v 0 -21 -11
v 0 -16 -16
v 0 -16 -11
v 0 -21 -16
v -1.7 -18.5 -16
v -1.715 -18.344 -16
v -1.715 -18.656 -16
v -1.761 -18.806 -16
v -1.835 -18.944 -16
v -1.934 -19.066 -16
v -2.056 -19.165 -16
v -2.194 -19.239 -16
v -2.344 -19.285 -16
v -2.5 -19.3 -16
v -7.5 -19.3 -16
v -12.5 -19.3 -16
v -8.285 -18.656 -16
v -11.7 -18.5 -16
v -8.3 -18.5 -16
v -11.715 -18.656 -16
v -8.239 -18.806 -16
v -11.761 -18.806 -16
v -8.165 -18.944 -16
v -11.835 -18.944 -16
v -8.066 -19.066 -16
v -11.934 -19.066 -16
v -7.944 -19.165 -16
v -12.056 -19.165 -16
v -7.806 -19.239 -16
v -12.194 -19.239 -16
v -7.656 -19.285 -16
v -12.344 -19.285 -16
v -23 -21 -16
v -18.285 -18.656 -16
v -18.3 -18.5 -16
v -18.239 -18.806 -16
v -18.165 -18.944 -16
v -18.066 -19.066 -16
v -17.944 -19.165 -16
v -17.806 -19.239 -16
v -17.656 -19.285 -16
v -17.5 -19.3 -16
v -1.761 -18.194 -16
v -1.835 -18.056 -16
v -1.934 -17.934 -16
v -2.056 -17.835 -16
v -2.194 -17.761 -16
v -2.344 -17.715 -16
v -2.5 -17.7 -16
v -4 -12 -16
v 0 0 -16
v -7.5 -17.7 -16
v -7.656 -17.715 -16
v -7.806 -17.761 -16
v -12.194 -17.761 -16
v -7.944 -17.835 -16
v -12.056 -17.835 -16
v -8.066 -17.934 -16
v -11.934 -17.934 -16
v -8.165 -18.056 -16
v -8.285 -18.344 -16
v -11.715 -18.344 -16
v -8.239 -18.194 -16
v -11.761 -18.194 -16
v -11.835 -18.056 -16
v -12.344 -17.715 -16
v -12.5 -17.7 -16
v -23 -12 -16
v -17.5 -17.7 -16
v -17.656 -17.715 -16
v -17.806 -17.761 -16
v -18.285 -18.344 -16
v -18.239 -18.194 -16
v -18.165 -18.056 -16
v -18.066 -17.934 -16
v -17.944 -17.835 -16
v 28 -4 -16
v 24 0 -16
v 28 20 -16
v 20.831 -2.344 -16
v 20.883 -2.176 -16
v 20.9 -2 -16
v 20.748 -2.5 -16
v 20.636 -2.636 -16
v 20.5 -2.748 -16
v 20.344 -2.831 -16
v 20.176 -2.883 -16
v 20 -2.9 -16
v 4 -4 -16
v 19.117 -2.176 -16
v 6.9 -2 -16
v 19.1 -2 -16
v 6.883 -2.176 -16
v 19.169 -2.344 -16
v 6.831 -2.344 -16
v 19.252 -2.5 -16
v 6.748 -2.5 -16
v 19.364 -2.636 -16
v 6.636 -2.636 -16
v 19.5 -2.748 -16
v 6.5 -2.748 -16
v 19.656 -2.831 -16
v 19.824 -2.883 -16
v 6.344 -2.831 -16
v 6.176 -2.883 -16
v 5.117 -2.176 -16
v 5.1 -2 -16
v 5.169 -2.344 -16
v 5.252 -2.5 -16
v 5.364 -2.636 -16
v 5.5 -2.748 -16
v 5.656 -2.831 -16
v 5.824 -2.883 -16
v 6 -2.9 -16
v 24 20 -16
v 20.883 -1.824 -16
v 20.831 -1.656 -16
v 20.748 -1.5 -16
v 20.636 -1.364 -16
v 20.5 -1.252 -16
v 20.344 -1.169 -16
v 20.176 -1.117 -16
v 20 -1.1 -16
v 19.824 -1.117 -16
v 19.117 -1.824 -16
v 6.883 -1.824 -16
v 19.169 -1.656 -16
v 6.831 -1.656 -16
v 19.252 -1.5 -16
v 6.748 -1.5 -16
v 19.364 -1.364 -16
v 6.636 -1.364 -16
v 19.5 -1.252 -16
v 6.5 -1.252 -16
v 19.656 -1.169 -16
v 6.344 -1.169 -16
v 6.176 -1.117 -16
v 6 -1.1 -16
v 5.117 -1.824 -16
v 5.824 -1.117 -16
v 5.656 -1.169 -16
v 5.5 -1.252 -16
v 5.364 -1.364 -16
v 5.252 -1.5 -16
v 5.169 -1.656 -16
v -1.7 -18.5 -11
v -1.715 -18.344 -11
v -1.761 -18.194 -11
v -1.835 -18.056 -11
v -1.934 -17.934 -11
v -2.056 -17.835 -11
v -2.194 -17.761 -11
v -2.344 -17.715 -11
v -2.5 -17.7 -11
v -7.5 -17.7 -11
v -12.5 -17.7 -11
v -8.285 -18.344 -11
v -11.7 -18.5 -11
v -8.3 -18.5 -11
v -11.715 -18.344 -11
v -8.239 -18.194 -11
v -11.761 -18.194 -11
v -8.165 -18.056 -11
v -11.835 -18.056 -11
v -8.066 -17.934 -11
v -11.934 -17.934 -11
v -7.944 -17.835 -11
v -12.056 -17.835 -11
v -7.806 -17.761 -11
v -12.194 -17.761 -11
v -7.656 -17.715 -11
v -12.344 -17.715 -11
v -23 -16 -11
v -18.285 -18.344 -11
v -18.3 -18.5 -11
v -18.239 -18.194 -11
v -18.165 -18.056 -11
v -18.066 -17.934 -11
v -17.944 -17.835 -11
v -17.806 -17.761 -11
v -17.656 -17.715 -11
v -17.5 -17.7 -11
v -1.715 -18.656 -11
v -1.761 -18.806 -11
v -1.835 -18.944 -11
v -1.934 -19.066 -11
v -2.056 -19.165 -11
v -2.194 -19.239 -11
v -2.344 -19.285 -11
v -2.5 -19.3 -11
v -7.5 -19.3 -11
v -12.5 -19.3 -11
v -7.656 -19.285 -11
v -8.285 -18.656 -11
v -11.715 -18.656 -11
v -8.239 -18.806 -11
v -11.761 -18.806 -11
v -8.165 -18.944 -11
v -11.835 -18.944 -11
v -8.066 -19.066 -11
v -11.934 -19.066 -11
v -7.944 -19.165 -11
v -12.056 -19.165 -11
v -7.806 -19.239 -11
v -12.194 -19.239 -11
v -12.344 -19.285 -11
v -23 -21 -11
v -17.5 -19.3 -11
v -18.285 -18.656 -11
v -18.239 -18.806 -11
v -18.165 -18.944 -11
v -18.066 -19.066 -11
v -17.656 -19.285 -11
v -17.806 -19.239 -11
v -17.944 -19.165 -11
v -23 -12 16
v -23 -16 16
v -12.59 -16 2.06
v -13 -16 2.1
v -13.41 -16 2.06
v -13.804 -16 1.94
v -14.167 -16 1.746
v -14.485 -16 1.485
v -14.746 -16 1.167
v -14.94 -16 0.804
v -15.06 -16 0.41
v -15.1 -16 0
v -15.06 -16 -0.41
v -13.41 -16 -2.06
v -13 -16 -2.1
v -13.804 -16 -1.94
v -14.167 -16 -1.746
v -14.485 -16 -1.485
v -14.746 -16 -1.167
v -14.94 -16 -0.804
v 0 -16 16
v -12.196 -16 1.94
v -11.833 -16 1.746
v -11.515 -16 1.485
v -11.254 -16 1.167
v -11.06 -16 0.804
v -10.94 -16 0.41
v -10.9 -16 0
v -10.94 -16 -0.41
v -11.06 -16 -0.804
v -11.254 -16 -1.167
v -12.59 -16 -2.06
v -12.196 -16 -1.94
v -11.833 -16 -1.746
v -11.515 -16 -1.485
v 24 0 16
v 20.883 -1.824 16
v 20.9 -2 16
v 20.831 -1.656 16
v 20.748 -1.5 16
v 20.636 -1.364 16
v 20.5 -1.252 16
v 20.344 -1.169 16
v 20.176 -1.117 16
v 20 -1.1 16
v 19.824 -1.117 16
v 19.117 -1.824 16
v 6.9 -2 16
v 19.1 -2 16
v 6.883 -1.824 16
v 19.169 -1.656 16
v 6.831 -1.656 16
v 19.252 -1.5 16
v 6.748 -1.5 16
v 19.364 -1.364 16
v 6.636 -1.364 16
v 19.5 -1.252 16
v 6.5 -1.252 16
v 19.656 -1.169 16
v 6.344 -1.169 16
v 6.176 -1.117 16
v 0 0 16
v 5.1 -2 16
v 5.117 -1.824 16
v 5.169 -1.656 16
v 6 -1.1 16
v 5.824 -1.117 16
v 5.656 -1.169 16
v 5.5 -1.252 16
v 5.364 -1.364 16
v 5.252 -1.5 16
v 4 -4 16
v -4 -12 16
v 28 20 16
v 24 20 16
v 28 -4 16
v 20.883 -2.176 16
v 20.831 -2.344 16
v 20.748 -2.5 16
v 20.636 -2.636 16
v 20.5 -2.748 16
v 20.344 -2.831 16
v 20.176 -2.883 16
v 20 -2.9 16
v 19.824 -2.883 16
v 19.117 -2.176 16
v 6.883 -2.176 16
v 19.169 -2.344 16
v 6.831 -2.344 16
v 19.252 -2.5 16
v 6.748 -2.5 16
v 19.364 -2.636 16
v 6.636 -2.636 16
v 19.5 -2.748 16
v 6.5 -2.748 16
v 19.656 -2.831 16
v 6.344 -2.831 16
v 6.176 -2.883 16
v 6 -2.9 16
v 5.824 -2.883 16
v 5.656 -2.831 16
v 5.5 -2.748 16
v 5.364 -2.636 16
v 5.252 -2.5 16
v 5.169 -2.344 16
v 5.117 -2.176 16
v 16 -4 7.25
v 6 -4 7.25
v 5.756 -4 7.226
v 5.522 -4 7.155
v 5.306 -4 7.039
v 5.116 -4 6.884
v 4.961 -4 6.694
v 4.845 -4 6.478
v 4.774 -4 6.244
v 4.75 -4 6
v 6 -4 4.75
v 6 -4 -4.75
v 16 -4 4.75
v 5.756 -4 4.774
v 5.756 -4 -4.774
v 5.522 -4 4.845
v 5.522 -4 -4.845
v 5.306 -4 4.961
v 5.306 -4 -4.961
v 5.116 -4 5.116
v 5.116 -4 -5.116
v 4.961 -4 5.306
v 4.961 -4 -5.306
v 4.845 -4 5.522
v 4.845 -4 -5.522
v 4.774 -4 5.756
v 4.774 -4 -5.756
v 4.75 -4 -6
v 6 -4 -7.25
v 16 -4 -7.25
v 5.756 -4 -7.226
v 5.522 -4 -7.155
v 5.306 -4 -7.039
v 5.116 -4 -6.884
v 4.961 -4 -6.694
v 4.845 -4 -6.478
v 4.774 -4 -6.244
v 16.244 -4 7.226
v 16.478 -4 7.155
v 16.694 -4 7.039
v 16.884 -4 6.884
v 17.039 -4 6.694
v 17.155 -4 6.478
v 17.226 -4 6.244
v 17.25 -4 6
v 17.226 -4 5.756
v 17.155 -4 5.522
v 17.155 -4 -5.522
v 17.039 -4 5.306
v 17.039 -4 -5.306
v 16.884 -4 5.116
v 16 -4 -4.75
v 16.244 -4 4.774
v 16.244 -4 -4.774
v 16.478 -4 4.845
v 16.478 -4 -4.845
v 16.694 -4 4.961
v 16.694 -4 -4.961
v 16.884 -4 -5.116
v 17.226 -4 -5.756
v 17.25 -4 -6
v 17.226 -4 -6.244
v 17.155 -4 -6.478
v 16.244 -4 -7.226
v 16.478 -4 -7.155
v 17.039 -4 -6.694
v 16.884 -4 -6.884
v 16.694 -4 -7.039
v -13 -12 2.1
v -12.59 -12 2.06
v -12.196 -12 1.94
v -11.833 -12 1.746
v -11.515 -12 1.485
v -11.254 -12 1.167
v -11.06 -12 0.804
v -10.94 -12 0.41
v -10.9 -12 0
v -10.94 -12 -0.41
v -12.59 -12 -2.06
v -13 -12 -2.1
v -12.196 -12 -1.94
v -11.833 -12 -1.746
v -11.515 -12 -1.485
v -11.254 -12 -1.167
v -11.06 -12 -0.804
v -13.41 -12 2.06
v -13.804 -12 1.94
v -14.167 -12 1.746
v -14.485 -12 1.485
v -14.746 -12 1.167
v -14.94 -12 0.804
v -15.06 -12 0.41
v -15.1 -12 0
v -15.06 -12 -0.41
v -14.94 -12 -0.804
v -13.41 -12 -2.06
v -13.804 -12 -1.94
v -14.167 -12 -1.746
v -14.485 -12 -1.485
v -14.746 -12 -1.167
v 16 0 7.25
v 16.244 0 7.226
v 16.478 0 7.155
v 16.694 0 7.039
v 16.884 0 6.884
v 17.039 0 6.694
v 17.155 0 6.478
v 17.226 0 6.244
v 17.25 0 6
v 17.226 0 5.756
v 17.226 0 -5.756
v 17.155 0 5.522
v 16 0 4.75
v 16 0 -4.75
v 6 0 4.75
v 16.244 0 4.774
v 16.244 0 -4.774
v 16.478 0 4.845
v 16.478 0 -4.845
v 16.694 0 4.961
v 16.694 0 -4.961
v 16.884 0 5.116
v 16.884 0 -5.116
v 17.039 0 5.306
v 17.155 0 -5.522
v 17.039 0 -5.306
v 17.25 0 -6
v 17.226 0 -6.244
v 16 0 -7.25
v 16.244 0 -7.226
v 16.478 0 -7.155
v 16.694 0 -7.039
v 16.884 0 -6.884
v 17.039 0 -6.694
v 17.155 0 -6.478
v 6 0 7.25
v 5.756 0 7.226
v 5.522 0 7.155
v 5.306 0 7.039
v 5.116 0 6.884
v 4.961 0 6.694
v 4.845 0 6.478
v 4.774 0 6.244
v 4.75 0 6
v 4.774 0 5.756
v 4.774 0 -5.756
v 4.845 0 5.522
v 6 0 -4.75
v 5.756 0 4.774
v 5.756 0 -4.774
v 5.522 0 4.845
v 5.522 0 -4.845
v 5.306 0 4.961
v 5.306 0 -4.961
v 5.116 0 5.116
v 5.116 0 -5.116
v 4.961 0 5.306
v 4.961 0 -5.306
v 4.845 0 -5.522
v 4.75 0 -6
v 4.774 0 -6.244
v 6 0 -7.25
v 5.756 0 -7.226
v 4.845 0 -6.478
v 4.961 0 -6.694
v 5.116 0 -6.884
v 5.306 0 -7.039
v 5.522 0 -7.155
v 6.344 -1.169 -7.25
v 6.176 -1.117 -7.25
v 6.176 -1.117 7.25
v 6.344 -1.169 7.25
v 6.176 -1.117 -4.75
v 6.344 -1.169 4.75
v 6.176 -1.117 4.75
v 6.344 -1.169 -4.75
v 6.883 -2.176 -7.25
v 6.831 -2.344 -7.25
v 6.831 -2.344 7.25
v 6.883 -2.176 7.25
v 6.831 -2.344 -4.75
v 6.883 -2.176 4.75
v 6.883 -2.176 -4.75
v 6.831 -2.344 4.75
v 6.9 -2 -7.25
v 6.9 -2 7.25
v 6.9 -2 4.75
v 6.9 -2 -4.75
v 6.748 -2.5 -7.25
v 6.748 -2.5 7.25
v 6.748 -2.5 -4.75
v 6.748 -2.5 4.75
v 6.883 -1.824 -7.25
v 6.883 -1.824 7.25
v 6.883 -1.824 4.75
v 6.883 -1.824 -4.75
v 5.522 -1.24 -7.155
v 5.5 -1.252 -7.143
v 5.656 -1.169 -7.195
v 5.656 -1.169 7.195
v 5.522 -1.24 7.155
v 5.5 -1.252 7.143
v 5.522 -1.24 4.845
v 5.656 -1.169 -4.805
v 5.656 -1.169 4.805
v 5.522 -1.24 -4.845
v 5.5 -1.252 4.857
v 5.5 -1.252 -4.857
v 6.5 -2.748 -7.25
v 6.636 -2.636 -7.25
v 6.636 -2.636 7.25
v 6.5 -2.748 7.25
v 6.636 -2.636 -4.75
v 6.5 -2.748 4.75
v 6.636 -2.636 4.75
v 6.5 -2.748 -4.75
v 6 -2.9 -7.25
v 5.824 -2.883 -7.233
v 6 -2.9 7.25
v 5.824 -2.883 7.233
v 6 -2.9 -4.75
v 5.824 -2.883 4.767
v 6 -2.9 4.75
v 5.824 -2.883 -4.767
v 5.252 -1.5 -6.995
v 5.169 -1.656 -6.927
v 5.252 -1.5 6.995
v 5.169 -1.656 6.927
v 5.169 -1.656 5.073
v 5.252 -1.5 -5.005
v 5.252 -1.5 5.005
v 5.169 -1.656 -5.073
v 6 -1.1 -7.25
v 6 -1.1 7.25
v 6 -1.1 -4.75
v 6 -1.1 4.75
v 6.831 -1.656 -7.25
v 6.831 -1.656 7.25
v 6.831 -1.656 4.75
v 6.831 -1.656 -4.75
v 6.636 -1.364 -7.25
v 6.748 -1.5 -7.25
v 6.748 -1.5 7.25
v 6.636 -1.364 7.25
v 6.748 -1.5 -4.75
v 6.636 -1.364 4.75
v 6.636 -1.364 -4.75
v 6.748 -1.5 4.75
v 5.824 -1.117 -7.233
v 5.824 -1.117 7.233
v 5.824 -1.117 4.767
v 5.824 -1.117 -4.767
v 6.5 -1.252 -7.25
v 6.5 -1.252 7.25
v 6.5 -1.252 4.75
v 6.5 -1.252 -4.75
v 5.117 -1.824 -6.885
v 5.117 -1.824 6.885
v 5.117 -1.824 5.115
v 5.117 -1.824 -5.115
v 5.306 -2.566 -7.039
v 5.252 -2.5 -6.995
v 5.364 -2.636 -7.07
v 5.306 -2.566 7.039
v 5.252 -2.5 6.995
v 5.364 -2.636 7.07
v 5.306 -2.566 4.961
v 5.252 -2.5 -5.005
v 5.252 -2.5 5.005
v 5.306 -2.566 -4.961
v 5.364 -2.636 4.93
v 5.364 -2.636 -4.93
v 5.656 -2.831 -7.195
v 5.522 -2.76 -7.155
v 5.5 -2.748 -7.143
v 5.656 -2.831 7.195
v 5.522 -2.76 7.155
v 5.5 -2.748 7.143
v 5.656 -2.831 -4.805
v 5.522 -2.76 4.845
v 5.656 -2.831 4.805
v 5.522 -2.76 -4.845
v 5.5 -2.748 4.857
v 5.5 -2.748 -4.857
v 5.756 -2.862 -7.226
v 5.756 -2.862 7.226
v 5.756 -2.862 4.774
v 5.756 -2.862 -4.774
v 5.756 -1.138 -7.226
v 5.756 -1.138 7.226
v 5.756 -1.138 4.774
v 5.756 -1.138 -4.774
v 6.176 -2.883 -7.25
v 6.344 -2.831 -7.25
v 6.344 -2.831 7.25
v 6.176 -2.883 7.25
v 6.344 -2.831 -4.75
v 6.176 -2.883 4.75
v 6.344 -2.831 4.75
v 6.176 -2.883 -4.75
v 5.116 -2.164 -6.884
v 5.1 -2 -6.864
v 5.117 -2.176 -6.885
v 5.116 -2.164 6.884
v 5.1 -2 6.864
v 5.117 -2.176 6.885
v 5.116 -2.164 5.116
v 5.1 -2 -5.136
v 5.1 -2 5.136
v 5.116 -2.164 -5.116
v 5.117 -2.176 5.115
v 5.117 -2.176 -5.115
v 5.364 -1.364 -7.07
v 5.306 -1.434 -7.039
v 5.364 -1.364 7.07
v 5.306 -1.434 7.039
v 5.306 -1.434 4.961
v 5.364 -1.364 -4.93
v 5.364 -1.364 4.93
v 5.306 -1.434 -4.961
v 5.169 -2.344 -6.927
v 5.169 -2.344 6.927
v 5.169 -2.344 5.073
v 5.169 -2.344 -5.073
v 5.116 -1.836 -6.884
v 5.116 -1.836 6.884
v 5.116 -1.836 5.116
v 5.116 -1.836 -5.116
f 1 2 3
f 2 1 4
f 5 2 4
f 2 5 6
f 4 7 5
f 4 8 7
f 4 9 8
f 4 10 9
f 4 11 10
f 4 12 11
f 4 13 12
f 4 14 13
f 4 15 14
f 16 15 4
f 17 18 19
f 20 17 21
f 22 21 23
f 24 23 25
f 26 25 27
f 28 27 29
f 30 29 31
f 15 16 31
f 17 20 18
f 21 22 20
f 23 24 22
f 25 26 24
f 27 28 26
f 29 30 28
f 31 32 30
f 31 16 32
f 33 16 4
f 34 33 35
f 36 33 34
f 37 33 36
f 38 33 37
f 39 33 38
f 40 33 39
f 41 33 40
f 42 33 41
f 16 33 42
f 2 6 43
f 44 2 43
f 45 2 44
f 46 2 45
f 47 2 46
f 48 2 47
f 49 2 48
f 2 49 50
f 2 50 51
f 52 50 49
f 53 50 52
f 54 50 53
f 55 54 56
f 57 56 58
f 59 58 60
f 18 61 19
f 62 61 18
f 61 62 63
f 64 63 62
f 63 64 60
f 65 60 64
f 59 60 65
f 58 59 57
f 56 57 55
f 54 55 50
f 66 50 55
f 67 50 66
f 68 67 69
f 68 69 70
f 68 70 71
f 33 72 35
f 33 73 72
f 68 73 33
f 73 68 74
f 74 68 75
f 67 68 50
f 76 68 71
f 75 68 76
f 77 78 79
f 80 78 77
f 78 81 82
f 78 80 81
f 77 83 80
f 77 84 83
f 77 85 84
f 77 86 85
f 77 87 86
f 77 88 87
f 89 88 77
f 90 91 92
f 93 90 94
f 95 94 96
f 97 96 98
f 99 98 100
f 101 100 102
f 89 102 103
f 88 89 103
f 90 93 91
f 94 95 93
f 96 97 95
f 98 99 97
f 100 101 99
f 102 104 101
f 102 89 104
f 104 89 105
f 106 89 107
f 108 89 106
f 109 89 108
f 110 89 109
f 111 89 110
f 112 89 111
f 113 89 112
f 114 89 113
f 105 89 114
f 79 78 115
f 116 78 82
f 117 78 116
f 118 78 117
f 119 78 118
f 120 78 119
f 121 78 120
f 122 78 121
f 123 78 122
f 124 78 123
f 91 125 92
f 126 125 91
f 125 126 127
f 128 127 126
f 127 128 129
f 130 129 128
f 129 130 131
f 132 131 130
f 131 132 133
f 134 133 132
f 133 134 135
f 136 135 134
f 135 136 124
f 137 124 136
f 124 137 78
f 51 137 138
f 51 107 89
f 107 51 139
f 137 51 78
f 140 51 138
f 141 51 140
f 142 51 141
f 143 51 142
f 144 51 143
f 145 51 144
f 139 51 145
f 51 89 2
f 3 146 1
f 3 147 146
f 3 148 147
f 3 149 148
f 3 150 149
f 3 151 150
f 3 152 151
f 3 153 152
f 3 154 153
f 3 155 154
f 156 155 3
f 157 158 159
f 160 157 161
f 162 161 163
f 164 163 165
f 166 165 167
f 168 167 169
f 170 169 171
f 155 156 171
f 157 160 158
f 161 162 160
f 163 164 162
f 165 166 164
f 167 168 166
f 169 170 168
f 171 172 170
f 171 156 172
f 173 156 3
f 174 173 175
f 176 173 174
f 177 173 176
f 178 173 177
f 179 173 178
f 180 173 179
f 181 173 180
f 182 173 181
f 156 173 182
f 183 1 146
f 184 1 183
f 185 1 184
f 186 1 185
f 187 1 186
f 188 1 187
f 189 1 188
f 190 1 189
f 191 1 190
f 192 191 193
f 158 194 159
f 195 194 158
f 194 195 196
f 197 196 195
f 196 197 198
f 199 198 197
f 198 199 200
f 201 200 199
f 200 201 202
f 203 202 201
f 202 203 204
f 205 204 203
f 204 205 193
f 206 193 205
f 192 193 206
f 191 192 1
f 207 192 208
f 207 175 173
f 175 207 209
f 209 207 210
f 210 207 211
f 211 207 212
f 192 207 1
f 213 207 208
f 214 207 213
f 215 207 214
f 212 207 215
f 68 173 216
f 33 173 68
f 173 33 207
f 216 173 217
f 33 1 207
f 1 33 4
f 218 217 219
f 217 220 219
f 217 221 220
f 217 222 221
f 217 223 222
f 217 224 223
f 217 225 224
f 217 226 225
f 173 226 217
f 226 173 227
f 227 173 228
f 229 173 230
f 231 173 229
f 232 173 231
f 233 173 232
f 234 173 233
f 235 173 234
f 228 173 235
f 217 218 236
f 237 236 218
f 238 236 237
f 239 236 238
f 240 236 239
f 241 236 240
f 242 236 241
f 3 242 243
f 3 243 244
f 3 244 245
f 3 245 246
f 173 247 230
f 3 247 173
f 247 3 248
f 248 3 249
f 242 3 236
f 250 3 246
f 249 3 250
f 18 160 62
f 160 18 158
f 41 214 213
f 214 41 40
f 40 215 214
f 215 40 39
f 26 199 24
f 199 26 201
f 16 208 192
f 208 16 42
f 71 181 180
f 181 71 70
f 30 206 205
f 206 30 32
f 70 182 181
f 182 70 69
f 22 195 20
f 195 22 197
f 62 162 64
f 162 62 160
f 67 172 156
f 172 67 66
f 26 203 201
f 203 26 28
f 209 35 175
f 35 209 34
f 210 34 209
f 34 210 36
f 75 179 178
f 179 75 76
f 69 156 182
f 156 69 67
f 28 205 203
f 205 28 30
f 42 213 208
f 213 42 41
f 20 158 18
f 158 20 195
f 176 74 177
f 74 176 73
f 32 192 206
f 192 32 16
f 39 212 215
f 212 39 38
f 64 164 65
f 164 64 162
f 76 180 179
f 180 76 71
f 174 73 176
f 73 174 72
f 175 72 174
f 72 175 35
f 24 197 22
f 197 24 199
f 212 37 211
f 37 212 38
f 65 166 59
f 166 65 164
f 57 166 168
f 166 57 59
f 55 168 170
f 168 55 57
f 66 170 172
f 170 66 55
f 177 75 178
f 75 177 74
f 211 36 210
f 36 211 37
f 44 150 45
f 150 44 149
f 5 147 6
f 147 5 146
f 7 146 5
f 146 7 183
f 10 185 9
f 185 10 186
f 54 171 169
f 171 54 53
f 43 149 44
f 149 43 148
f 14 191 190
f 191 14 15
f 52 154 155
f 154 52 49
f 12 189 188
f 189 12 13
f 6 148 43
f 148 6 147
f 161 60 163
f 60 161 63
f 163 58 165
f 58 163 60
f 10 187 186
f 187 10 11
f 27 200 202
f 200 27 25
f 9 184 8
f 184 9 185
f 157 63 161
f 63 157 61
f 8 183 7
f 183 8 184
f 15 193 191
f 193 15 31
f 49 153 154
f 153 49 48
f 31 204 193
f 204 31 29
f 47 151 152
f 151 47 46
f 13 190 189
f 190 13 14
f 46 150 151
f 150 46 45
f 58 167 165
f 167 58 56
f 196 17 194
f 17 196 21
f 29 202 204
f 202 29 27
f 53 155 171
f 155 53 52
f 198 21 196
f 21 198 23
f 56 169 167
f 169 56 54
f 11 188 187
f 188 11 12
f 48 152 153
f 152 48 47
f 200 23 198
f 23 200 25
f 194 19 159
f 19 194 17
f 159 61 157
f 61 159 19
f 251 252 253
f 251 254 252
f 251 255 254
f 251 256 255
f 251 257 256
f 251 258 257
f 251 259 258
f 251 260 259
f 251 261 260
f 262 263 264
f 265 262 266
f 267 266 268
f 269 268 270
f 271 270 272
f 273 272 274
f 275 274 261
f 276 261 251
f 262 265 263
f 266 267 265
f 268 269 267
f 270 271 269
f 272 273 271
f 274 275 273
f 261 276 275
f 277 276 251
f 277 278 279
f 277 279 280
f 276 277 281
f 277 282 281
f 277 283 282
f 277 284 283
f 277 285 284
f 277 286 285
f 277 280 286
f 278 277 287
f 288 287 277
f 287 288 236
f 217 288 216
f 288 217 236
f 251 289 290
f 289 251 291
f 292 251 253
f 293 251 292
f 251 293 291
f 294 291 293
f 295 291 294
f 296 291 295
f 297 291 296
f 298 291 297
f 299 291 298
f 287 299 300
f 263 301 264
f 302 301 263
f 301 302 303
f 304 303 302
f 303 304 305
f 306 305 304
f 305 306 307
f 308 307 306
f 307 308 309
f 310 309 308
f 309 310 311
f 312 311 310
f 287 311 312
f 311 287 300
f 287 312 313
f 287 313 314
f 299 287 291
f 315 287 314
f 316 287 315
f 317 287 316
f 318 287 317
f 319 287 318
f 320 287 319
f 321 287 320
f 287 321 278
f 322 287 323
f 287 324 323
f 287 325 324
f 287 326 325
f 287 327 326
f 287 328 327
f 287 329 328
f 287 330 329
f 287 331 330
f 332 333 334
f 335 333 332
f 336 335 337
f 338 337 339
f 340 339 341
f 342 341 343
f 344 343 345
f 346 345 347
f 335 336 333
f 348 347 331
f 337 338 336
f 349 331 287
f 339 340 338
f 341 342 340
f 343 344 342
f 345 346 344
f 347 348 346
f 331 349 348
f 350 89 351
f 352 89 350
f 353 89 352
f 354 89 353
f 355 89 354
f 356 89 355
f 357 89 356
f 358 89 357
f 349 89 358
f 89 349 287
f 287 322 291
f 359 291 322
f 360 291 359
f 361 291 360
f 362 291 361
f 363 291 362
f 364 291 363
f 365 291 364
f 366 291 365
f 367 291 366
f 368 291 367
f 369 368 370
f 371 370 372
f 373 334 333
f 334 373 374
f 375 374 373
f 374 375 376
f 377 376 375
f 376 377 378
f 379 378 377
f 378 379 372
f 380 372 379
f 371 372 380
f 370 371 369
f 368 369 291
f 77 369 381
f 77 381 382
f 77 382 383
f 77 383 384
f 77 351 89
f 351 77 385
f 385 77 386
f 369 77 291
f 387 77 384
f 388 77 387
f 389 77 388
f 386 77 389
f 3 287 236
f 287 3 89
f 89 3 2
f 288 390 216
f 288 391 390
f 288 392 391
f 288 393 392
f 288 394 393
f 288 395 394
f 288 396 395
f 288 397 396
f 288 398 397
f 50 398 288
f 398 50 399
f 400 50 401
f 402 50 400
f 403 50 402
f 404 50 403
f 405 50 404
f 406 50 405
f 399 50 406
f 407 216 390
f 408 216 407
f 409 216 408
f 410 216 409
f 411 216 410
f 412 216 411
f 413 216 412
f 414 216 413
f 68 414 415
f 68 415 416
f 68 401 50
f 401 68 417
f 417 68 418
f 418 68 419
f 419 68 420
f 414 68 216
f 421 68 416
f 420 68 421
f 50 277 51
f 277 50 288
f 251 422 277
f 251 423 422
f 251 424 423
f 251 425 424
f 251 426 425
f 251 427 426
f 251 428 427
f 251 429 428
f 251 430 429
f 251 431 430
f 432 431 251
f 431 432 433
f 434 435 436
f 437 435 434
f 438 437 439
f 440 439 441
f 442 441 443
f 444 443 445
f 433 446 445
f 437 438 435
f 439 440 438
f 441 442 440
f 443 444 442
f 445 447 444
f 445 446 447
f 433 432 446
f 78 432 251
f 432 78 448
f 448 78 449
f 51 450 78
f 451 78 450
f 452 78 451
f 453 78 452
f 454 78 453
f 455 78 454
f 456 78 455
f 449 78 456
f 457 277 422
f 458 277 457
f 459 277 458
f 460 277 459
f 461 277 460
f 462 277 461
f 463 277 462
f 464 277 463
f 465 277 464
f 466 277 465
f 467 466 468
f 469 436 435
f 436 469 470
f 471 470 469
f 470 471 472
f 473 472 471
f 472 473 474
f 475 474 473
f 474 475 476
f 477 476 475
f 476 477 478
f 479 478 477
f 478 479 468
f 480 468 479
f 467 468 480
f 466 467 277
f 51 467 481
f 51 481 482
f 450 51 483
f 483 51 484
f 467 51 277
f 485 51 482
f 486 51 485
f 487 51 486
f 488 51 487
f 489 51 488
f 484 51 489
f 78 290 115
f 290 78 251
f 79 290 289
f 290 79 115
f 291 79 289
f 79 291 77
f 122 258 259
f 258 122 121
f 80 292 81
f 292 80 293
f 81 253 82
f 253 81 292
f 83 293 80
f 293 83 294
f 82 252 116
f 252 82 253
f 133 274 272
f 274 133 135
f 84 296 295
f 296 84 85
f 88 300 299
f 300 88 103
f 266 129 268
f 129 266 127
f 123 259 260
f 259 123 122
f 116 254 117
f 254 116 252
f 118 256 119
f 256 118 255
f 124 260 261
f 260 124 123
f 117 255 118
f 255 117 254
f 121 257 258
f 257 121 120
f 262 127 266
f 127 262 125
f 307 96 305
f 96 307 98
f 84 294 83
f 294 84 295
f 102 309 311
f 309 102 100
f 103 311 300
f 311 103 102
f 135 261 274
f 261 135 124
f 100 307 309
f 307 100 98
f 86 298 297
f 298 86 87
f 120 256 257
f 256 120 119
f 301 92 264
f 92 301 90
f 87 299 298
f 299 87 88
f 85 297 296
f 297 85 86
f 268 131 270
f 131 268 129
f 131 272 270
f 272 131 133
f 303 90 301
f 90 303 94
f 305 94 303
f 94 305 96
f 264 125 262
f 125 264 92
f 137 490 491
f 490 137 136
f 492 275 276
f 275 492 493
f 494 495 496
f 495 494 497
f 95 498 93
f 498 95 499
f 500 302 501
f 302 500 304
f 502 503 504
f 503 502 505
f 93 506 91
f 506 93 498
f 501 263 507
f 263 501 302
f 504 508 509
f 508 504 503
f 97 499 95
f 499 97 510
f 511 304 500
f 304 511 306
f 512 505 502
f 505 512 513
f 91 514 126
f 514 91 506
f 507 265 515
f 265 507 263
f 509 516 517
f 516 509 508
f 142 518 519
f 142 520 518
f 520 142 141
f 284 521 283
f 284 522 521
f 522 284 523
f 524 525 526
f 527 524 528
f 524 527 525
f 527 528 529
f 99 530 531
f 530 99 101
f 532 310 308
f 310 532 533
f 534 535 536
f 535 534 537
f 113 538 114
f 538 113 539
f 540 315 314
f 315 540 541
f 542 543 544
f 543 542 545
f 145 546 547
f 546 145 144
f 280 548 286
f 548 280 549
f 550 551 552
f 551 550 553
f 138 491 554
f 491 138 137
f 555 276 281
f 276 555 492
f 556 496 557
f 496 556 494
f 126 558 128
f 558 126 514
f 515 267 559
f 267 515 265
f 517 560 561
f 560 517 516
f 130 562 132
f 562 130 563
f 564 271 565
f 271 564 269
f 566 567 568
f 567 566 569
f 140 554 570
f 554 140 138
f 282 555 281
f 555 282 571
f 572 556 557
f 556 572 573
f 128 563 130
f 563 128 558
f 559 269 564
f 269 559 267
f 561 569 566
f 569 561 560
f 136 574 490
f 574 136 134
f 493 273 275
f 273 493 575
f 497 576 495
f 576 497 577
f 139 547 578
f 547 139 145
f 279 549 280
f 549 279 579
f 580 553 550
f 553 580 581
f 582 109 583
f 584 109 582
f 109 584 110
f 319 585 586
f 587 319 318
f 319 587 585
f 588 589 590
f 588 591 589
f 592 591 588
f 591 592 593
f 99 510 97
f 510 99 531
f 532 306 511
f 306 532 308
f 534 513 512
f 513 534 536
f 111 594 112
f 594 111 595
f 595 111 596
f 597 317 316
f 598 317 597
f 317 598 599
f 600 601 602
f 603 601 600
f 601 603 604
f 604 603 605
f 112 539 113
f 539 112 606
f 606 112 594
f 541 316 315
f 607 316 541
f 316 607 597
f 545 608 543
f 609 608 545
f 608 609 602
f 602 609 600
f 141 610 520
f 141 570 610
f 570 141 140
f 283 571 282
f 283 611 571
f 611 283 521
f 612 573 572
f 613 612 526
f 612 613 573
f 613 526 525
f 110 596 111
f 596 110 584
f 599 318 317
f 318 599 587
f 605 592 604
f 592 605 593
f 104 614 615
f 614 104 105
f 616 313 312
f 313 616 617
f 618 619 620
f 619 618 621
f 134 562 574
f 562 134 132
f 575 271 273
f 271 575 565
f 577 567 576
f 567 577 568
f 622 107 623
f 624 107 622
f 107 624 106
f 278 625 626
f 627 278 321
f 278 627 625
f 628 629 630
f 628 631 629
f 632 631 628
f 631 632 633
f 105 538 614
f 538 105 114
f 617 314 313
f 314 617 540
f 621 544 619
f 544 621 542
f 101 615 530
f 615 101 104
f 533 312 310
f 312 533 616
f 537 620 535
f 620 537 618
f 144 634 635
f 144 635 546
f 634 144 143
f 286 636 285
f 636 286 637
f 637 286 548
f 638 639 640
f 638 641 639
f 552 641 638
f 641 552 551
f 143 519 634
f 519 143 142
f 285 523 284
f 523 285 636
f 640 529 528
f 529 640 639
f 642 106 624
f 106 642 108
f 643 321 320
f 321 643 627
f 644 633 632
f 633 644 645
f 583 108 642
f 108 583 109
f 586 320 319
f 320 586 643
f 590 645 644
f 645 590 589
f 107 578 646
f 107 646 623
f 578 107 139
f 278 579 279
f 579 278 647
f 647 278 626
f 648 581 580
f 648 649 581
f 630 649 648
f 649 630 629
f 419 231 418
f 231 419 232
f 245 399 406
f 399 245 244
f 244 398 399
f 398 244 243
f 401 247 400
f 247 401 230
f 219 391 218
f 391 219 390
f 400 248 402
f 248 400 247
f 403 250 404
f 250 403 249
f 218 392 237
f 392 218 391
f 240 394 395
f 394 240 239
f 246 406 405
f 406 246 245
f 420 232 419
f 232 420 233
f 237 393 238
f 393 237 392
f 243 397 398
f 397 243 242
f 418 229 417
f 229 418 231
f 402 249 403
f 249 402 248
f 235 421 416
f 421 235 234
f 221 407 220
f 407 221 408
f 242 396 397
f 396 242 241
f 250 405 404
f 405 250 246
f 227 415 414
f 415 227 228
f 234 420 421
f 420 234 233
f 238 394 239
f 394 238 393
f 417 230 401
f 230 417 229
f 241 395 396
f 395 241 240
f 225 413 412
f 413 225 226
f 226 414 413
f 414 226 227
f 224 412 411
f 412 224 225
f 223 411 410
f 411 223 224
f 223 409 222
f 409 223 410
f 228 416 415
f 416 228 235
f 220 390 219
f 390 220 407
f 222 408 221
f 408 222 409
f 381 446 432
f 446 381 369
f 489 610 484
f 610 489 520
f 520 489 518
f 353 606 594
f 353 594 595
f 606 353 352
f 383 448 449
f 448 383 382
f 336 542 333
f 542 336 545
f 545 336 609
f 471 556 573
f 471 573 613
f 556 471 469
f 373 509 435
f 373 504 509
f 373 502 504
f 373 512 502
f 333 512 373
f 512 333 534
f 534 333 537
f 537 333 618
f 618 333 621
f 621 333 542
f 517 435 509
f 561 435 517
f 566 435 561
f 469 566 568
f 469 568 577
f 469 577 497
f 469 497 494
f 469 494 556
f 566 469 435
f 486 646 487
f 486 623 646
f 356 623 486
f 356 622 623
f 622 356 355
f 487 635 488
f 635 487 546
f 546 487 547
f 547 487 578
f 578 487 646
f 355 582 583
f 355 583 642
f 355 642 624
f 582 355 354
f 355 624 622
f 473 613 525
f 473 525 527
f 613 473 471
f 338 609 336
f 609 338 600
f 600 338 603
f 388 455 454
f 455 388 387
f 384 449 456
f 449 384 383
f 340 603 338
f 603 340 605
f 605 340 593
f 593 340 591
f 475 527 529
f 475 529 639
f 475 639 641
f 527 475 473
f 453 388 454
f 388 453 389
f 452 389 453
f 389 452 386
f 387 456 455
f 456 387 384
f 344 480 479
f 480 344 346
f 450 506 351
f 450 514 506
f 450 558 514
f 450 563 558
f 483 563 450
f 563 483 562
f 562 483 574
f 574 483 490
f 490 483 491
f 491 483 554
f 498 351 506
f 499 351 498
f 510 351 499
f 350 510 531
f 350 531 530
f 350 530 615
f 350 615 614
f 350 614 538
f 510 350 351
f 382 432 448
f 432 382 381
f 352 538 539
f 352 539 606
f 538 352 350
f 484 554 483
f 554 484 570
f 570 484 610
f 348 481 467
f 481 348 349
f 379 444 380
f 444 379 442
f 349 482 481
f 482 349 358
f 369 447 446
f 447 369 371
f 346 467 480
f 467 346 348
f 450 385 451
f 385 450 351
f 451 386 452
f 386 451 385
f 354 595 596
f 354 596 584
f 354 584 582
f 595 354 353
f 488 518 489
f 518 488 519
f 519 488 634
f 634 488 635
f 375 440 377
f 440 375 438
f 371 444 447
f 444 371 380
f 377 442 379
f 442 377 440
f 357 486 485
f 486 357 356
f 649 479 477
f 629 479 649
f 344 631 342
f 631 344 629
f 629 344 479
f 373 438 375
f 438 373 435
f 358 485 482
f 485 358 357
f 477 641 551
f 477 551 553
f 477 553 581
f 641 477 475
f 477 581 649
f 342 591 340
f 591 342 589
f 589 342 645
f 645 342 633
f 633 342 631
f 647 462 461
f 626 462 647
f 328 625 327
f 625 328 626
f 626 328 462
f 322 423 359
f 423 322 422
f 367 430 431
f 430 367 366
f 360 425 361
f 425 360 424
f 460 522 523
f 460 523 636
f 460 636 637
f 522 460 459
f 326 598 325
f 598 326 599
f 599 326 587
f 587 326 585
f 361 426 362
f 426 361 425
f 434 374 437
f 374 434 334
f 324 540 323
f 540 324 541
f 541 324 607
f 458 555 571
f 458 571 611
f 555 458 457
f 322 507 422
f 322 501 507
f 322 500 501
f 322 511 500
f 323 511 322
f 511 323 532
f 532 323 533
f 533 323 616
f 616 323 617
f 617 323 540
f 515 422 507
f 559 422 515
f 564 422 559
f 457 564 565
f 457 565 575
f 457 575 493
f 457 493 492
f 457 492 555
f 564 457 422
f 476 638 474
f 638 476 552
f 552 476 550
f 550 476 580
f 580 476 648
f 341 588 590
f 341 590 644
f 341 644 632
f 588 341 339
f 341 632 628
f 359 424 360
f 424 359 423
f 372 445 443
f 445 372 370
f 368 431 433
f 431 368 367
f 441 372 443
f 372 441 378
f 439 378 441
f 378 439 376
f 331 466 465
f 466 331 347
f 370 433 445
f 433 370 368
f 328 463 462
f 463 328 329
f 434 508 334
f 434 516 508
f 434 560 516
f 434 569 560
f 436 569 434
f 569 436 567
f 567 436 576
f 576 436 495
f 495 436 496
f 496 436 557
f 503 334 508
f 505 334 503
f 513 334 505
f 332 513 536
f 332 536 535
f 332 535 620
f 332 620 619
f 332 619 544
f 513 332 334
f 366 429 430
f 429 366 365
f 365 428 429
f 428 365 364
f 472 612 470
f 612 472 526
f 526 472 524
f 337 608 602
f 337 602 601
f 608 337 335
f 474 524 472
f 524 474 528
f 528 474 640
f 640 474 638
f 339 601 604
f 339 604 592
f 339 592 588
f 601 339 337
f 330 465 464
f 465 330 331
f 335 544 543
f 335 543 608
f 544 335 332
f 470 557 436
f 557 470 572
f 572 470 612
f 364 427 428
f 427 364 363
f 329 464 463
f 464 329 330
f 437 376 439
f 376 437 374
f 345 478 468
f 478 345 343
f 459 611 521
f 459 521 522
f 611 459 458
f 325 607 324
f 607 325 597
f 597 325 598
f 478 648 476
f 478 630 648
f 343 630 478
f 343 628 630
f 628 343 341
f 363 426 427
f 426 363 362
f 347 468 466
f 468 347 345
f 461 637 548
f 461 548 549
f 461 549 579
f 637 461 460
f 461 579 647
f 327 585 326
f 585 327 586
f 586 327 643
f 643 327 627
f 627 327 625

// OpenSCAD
module ratf_solenoid() {
  $fn = 32;
  sw = 4;
  sh = 16;
  disp_u = 4;
  difference() {
    union() {
      linear_extrude(height = 32, center = true, convexity = 10, twist = 0)
      polygon(points = [[0, 0], 
                        [24, 0],
                        [24, -20],
                        [24 + sw, -20],
                        [24 + sw, sw],
                        [24, sw],
                        [sw, sw],
                        [sw - disp_u, sh],
                        [-19 - disp_u, sh],
                        [-19 - disp_u, sh - sw],
                        [-disp_u, sh - sw],
                        [0, 0]
                       ]);
      
      // Switch Support
      translate([-11.5, 18.5, 13.5])
      difference() {
        cube([23, 5, 5], center = true);  
        
        hull() {
          translate([-1, 0, 0])
          rotate([0, 0, 90])
          cylinder(d = 1.6, h = 10, center = true);

          translate([-6, 0, 0])
          rotate([0, 0, 90])
          cylinder(d = 1.6, h = 10, center = true);
        }

        hull() {
          translate([9, 0, 0])
          rotate([0, 0, 90])
          cylinder(d = 1.6, h = 10, center = true);

          translate([4, 0, 0])
          rotate([0, 0, 90])
          cylinder(d = 1.6, h = 10, center = true);
        }
      }
    }    
    
    // Hinge holes
    translate([24 - 4, sw/2, 0])
    #cylinder(d = 1.8, h = 200, center = true);     

    translate([24 - 4 - 14, sw/2, 0])
    #cylinder(d = 1.8, h = 200, center = true);     
    
    // center hole
    translate([-26/2, 0, 0])
    rotate([90, 0, 0])
    cylinder(d = 4.2, h = 200, center = true); 

    // body holes
    hull() {
      translate([6, 0, 12/2])
      rotate([90, 0, 0])
      cylinder(d = 2.5, h = 200, center = true); 

      translate([16, 0, 12/2])
      rotate([90, 0, 0])
      cylinder(d = 2.5, h = 200, center = true); 
    }

    hull() {
      translate([6, 0, -12/2])
      rotate([90, 0, 0])
      cylinder(d = 2.5, h = 200, center = true); 

      translate([16, 0, -12/2])
      rotate([90, 0, 0])
      cylinder(d = 2.5, h = 200, center = true); 
    }

  }
}

rotate([180, 0, 0])
ratf_solenoid();
